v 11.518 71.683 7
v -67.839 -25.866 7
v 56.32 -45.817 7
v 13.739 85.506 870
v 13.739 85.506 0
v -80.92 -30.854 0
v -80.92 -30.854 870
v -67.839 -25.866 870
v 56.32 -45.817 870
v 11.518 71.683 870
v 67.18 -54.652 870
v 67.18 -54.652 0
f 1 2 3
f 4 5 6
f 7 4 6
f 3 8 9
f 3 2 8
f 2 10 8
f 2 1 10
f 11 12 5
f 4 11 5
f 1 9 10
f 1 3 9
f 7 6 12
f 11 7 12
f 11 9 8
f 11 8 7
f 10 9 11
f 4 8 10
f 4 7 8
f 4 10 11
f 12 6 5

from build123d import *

# Parameters (mm, degrees)
F1_DEPTH = 870
F2_T     = -7


with BuildPart() as f1:
    # F0 (on Top) → F1 (new body)
    with BuildSketch(Plane.XY):
        Polygon((13.739455, 85.505716), (-80.919849, -30.854141), (67.180395, -54.651574), align=None)
    extrude(amount=F1_DEPTH)

    # F2
    f2_openings = [f1.faces().sort_by_distance(p)[0] for p in [
        (0, 0, 870),
    ]]
    offset(amount=F2_T, openings=f2_openings)


solid = f1.part
